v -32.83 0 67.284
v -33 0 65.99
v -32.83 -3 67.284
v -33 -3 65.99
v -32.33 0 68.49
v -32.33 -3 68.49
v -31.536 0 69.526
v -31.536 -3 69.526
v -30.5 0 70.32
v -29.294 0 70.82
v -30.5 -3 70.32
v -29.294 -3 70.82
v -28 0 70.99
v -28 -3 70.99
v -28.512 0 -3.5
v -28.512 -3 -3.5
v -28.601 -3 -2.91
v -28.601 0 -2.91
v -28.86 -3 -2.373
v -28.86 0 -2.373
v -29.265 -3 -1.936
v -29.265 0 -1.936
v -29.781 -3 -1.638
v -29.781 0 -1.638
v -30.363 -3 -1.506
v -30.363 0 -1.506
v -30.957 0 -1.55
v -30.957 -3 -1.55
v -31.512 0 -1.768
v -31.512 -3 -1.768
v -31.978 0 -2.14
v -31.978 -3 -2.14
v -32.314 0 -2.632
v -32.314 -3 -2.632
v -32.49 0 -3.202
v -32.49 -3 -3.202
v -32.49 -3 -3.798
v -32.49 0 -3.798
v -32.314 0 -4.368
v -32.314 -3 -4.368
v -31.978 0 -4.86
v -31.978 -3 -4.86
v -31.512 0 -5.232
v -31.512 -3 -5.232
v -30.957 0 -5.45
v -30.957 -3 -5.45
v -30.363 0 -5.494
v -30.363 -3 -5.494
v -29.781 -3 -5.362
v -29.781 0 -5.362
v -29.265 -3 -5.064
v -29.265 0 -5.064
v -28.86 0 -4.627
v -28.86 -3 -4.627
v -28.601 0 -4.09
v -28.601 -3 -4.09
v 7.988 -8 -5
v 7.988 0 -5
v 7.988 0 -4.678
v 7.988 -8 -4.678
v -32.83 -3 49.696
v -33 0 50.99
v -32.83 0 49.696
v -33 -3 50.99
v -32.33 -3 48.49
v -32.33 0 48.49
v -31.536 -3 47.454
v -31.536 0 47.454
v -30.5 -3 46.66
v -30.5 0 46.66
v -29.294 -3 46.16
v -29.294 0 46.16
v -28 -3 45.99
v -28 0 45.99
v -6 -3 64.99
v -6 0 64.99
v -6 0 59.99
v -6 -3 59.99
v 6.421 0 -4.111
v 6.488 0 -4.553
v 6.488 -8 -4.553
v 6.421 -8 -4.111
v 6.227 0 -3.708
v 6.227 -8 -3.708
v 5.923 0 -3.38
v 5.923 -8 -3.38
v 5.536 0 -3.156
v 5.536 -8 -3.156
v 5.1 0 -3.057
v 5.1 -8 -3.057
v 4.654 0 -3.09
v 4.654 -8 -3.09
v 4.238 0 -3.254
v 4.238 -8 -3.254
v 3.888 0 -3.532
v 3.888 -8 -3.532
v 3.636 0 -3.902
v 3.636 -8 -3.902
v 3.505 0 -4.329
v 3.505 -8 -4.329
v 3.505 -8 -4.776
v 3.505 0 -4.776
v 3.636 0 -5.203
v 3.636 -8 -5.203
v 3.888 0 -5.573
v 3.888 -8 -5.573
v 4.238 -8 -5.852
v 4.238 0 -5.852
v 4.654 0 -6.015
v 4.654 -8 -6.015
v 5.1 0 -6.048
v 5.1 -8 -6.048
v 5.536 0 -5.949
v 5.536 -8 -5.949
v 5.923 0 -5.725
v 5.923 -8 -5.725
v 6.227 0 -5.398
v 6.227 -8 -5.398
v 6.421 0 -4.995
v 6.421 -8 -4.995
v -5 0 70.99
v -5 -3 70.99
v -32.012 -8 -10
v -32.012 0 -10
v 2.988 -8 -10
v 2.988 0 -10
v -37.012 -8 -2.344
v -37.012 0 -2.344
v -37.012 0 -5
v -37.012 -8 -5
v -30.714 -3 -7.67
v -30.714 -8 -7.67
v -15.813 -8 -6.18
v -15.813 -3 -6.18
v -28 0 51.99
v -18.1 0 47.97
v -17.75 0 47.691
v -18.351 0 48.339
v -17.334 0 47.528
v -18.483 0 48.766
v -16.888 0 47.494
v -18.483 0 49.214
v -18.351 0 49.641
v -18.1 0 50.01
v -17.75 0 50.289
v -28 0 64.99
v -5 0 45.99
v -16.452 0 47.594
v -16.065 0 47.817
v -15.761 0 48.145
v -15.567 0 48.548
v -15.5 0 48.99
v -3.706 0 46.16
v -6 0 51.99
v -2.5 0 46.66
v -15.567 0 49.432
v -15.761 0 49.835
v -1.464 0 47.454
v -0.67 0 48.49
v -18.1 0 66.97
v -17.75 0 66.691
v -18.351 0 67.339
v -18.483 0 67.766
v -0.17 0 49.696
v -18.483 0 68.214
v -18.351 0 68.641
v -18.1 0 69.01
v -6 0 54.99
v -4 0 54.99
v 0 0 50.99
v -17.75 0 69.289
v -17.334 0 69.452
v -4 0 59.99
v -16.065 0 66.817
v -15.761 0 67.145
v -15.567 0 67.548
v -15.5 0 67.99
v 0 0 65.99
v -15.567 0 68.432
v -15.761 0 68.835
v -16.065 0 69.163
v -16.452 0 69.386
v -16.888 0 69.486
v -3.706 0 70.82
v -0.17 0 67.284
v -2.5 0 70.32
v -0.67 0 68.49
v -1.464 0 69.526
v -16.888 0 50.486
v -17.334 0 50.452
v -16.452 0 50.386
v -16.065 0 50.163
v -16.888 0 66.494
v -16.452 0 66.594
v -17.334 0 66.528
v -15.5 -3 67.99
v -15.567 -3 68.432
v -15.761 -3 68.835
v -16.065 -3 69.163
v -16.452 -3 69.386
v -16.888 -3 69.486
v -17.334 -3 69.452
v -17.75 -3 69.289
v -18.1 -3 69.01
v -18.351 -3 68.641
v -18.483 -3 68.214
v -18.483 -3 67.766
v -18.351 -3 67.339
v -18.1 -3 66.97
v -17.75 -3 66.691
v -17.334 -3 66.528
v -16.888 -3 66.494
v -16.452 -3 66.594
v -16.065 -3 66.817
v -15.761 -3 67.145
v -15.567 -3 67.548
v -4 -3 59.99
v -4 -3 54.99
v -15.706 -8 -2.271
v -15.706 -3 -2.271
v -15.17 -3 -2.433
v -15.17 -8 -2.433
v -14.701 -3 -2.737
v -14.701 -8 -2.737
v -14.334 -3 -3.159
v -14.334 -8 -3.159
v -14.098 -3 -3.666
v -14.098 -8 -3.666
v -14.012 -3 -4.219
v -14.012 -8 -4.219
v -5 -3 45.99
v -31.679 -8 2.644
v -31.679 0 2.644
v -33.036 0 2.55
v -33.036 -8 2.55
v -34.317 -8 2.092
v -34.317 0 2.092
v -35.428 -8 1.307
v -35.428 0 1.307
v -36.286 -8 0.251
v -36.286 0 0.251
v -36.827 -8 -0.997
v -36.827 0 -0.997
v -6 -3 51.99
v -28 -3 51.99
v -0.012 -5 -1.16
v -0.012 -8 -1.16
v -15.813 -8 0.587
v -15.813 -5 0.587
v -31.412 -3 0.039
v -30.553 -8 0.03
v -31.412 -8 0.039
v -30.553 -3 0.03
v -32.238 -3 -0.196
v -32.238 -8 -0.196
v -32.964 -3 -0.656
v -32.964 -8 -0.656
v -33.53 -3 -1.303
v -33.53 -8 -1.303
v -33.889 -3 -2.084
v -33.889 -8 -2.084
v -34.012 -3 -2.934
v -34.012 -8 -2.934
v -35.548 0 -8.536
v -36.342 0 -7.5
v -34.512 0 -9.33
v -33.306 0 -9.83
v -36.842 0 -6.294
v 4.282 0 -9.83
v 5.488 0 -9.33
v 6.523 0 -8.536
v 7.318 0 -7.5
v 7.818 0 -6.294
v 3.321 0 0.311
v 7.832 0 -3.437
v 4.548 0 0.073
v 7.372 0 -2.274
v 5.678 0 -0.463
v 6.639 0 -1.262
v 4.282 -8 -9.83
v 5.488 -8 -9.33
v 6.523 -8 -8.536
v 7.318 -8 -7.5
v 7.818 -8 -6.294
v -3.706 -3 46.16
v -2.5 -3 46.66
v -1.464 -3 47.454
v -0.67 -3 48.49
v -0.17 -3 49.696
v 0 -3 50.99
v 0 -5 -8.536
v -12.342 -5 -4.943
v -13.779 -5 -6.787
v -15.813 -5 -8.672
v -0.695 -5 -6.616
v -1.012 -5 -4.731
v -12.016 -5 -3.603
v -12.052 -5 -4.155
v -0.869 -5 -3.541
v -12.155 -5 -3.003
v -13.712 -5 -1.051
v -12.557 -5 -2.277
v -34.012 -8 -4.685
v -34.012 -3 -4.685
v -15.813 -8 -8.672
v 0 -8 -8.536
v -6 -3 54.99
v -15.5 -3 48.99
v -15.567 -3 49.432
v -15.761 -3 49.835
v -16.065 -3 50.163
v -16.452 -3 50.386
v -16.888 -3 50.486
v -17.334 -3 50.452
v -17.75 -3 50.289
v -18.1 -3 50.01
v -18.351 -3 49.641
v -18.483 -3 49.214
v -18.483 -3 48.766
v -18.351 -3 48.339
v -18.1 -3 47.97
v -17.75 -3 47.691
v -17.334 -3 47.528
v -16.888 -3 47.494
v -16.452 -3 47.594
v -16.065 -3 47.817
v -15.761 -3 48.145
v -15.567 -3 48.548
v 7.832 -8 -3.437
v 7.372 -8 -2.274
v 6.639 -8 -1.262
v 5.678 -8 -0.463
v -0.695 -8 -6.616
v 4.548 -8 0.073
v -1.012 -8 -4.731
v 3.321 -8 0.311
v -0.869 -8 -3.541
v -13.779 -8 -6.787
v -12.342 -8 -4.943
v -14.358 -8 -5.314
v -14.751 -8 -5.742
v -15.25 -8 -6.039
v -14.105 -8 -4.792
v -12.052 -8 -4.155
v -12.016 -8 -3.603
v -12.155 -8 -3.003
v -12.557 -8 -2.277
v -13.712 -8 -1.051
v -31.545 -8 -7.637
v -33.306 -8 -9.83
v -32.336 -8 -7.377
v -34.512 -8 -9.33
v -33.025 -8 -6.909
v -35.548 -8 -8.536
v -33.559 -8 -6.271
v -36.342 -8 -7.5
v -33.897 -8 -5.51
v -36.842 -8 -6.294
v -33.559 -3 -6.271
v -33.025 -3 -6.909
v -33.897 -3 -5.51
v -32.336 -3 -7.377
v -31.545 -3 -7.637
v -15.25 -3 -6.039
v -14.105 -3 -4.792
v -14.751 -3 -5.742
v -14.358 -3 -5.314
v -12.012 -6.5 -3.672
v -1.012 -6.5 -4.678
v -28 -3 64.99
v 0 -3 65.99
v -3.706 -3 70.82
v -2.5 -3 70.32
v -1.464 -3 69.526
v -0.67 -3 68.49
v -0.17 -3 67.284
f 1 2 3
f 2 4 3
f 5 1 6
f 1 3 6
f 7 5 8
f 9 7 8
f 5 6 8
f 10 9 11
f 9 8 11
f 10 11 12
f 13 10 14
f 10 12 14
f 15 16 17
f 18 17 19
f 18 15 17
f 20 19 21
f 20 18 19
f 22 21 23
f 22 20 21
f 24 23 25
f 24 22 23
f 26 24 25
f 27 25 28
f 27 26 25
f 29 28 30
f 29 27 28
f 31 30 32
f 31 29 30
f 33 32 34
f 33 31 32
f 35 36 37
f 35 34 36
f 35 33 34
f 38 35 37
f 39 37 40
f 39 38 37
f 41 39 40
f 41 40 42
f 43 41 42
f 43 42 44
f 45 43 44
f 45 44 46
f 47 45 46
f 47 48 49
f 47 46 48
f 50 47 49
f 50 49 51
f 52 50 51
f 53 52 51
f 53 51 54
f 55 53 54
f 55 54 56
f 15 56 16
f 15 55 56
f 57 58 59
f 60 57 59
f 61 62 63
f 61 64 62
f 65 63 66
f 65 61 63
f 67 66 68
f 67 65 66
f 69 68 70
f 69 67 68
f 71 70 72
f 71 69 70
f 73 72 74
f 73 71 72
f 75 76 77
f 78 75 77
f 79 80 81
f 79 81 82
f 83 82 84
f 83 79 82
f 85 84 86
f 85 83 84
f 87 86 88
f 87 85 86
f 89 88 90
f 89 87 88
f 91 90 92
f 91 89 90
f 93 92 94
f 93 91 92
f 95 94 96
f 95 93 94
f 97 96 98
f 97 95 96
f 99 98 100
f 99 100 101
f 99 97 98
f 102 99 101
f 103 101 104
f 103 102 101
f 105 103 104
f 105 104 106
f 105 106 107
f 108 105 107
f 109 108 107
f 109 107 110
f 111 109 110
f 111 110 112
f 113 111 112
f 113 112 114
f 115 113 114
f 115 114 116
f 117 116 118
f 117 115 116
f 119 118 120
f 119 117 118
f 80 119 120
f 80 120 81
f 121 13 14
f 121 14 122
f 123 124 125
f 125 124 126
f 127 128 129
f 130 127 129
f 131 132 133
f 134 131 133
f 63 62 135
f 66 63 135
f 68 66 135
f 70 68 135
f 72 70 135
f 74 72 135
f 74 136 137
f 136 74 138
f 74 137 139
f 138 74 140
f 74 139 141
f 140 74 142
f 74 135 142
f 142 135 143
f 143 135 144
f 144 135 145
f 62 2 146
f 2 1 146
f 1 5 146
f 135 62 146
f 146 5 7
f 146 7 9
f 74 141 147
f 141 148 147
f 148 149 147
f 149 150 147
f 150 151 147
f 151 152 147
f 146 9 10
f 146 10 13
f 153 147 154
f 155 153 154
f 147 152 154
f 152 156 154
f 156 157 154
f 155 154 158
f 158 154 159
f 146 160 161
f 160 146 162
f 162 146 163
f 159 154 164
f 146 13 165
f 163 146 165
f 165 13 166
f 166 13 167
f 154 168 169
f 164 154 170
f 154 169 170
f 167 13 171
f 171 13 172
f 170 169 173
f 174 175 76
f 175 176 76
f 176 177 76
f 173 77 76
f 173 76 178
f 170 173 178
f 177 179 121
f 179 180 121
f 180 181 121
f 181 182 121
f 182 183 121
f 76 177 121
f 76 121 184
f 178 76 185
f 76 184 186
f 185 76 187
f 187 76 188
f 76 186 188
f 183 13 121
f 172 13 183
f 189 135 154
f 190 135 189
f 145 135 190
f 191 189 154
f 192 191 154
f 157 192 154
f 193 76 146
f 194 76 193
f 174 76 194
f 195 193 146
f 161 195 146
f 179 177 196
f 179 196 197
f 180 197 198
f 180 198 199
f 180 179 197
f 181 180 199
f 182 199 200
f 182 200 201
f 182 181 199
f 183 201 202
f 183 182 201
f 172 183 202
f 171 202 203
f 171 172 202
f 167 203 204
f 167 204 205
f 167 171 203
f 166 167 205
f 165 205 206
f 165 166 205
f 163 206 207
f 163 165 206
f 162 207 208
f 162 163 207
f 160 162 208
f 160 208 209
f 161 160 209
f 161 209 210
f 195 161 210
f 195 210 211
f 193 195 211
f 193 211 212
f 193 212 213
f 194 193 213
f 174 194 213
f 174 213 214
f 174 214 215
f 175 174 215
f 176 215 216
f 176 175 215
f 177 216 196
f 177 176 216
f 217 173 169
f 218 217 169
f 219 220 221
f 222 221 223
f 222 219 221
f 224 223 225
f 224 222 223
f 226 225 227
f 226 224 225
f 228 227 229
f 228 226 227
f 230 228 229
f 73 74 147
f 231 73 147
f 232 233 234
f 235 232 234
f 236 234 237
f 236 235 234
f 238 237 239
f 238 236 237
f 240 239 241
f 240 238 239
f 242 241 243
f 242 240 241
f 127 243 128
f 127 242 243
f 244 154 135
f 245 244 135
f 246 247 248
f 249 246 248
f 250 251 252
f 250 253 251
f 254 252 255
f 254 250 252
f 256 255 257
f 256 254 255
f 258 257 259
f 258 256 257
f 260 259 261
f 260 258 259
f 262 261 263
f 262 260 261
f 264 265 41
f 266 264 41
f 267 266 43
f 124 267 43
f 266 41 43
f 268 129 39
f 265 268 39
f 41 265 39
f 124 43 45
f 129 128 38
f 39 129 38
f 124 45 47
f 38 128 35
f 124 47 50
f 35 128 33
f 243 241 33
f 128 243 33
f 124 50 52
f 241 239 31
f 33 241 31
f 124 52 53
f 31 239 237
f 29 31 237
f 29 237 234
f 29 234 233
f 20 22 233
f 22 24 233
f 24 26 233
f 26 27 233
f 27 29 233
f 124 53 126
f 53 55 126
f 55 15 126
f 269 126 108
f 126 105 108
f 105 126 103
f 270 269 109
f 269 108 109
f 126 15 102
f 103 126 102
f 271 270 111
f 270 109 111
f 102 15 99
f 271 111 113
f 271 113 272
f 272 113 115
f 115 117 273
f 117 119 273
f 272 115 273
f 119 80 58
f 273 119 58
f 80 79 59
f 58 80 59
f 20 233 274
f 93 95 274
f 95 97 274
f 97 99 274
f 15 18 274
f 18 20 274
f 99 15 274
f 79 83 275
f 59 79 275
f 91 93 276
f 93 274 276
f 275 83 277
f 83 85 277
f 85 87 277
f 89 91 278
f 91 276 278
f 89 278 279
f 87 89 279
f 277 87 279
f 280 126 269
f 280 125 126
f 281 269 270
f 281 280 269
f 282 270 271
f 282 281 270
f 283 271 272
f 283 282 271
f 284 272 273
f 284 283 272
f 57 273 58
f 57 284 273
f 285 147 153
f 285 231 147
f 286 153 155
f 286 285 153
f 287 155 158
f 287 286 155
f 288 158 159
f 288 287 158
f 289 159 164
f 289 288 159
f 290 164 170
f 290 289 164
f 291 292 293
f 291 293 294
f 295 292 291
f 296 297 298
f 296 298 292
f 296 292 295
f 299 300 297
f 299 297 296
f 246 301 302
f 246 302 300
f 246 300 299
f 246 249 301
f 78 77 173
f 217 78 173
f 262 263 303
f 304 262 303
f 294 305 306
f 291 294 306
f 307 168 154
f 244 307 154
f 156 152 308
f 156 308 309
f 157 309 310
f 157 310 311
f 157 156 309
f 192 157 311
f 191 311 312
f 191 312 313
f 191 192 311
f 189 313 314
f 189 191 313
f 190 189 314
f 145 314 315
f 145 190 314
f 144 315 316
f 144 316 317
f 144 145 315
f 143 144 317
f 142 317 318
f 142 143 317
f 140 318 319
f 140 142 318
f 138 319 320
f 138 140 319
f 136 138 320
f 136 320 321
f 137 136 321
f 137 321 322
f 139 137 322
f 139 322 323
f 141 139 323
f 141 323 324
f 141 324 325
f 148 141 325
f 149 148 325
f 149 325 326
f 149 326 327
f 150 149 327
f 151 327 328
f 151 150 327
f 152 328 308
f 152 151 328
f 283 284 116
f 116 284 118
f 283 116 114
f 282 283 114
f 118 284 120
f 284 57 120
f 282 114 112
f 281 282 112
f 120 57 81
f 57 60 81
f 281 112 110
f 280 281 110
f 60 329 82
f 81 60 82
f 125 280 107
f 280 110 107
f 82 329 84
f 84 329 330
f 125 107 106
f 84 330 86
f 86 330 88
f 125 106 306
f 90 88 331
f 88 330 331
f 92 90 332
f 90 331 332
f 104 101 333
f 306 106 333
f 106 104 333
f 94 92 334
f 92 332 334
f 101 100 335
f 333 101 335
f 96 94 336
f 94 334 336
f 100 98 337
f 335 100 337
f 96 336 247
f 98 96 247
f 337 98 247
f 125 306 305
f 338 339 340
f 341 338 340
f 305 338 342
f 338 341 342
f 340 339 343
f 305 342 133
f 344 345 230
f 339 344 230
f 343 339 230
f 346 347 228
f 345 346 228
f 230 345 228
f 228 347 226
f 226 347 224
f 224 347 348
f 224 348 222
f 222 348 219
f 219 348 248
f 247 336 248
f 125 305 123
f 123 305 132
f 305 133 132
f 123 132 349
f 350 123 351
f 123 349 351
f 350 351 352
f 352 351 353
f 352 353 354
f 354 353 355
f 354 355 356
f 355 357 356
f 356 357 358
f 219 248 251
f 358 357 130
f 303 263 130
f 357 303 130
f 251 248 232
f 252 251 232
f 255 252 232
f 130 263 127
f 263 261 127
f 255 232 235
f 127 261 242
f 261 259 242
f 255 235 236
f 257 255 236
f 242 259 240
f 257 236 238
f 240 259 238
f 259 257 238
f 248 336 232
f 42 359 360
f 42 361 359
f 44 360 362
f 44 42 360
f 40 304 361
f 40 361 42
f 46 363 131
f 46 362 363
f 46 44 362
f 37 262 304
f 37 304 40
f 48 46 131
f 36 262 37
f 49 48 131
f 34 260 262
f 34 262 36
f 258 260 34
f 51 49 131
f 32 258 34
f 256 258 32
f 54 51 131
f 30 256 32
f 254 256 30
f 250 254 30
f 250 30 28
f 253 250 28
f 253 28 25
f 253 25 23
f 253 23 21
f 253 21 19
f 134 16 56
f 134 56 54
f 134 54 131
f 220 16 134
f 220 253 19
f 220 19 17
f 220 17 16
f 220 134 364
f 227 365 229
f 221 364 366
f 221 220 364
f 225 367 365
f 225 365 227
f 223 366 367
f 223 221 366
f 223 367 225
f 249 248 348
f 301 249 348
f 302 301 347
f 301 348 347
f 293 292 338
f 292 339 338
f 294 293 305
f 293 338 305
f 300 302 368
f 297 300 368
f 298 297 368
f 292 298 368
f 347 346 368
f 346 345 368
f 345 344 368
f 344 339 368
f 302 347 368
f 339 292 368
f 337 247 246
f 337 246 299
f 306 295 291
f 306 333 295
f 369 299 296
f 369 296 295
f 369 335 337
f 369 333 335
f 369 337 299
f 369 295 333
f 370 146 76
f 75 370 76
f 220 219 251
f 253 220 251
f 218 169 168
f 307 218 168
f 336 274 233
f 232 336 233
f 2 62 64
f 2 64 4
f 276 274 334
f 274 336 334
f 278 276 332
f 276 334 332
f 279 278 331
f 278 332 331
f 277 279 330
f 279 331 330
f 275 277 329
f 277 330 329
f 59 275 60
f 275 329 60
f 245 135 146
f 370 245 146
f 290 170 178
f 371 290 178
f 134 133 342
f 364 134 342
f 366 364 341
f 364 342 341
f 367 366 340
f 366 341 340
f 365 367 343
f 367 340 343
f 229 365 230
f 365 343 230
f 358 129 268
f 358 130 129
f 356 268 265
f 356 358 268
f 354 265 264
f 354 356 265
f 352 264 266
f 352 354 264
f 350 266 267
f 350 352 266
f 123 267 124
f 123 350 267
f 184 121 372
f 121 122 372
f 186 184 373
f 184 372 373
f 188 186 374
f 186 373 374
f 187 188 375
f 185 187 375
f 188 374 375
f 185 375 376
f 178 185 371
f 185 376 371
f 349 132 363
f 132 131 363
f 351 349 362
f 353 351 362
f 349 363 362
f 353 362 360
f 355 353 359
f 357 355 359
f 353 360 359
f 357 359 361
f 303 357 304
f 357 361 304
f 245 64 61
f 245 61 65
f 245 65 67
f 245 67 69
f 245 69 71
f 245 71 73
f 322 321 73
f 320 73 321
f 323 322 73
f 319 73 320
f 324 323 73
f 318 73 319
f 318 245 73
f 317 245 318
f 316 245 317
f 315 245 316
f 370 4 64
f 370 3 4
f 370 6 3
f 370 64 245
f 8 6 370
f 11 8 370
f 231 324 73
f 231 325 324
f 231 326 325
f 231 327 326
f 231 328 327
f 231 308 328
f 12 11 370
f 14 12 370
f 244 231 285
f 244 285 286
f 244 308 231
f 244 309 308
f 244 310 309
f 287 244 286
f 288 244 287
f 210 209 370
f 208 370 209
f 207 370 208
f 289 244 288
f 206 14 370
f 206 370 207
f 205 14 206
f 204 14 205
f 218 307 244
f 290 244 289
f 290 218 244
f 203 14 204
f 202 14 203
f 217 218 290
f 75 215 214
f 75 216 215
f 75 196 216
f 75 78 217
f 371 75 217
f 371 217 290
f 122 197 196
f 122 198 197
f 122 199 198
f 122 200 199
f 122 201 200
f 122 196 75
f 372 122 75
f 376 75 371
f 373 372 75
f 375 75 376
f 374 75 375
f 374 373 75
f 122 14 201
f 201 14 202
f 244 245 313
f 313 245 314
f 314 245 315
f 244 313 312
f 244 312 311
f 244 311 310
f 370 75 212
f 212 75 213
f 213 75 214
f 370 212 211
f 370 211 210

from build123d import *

# Parameters (mm, degrees)
F0_R        = 1.5
F0_R_2      = 2
F1_DEPTH    = 8
F2_R        = 5
F3_R        = 5
F5_DEPTH    = 5
F6_R        = 3
F7_T4_DEPTH = 9.2847060191
F7_T9_DEPTH = 9.5249378106
F9_DEPTH    = 3
F10_W       = 33
F10_H       = 25
F10_R       = 1.5
F11_DEPTH   = 3
F12_R       = 5


# Not quite as in the source:
# - a fillet or chamfer that OpenCascade refuses, or shapes differently, is made with other operations: its cross-section is extruded or revolved along the edge and cut away or added


with BuildPart() as f1:
    # F0 (on Front) → F1 (new body)
    with BuildSketch(Plane.XZ):
        Polygon((-37.012051791, 3), (-37.012051791, -10), (7.987948209, -10), (7.987948209, 0), align=None)
        with Locations((4.987948209, -4.5526479371)):
            Circle(F0_R, mode=Mode.SUBTRACT)
        with Locations((-30.512051791, -3.5)):
            Circle(F0_R_2, mode=Mode.SUBTRACT)
    extrude(amount=F1_DEPTH)

    # F2
    f2_edges = [f1.edges().sort_by_distance(p)[0] for p in [
        (7.987948, -4, 0),
        (7.987948, -4, -10),
    ]]
    fillet(f2_edges, radius=F2_R)

    # F3
    f3_edges = [f1.edges().sort_by_distance(p)[0] for p in [
        (-37.012052, -4, 3),
        (-37.012052, -4, -10),
    ]]
    fillet(f3_edges, radius=F3_R)

    # F4 (on face) → F5 (cut)
    with BuildSketch(Plane.XZ.offset(8)):
        Polygon((-34.012051791, -8), (-14.012051791, -6), (-14.012051791, -2.5333333333), (-34.012051791, 0.5666666667), align=None)
    extrude(amount=-F5_DEPTH, mode=Mode.SUBTRACT)

    # F6
    f6_edges = [f1.edges().sort_by_distance(p)[0] for p in [
        (-34.012052, -5.5, 0.566667),
        (-34.012052, -5.5, -8),
    ]]
    fillet(f6_edges, radius=F6_R)

    # F7: fillet of radius 2 on 2 edges, made by hand


with BuildPart() as f7_tool2:
    # F7_s3 → F7_t4 (new body)
    with BuildSketch(Plane.XZ.offset(8)):
        with BuildLine():
            ThreePointArc((-15.7057098821, -2.2708163292), (-14.493387276, -2.9458095434), (-14.012051791, -4.247215741))
            Line((-14.012051791, -4.247215741), (-14.012051791, -2.5333333333))
            Line((-14.012051791, -2.5333333333), (-15.7057098821, -2.2708163292))
        make_face()
    extrude(amount=-F7_T4_DEPTH)

    split(bisect_by=Plane.XZ, keep=Keep.TOP)


with BuildPart() as f1_1:
    add(f1.part)

    # F7_t1: union F7_tool2
    add(f7_tool2.part)


with BuildPart() as f7_tool7:
    # F7_s8 → F7_t9 (new body)
    with BuildSketch(Plane.XZ.offset(8)):
        with BuildLine():
            ThreePointArc((-15.8130443529, -6.1800992562), (-14.5291467238, -5.5320355173), (-14.012051791, -4.1900248758))
            Line((-14.012051791, -4.1900248758), (-14.012051791, -6))
            Line((-14.012051791, -6), (-15.8130443529, -6.1800992562))
        make_face()
    extrude(amount=-F7_T9_DEPTH)

    split(bisect_by=Plane.XZ, keep=Keep.TOP)


with BuildPart() as f1_2:
    add(f1_1.part)

    # F7_t6: union F7_tool7
    add(f7_tool7.part)

    # F8 (on face) → F9 (cut)
    with BuildSketch(Plane.XZ.offset(8)):
        with BuildLine():
            Line((-0.0122538466, -1.1595856835), (-15.8130443529, 0.5867328375))
            add(Edge.make_bspline(
                [(-15.8130443529, 0.5867328375), (-13.9420993532, -0.7916096765), (-10.1086636088, -3.615737303), (-13.88155084, -6.9601010481), (-15.8130443529, -8.6722160631)],
                knots=[0, 0, 0, 0, 0.4880595696, 1, 1, 1, 1], degree=3))
            Line((-15.8130443529, -8.6722160631), (0, -8.5355339059))
            add(Edge.make_bspline(
                [(-0.0122538466, -1.1595856835), (-0.5061323056, -2.3179393868), (-1.5154357631, -4.6859516385), (-0.5124182093, -7.2339464419), (0, -8.5355339059)],
                knots=[0, 0, 0, 0, 0.4891776198, 1, 1, 1, 1], degree=3))
        make_face()
    extrude(amount=-F9_DEPTH, mode=Mode.SUBTRACT)


with BuildPart() as f11:
    # F10 (on Front) → F11 (new body)
    with BuildSketch(Plane.XZ):
        with Locations((-16.5, 58.4899739623)):
            Rectangle(F10_W, F10_H)
        with Locations((-17, 48.9899739623)):
            Circle(F10_R, mode=Mode.SUBTRACT)
        Polygon((-6, 51.9899739623), (-28, 51.9899739623), (-28, 64.9899739623), (-6, 64.9899739623), (-6, 59.9899739623), (-4, 59.9899739623), (-4, 54.9899739623), (-6, 54.9899739623), align=None, mode=Mode.SUBTRACT)
        with Locations((-17, 67.9899739623)):
            Circle(F10_R, mode=Mode.SUBTRACT)
    extrude(amount=F11_DEPTH)

    # F12
    f12_edges = [f11.edges().sort_by_distance(p)[0] for p in [
        (-33, -1.5, 70.989974),
        (-33, -1.5, 45.989974),
        (0, -1.5, 45.989974),
        (0, -1.5, 70.989974),
    ]]
    fillet(f12_edges, radius=F12_R)


solid = Compound([f1_2.part, f11.part])
